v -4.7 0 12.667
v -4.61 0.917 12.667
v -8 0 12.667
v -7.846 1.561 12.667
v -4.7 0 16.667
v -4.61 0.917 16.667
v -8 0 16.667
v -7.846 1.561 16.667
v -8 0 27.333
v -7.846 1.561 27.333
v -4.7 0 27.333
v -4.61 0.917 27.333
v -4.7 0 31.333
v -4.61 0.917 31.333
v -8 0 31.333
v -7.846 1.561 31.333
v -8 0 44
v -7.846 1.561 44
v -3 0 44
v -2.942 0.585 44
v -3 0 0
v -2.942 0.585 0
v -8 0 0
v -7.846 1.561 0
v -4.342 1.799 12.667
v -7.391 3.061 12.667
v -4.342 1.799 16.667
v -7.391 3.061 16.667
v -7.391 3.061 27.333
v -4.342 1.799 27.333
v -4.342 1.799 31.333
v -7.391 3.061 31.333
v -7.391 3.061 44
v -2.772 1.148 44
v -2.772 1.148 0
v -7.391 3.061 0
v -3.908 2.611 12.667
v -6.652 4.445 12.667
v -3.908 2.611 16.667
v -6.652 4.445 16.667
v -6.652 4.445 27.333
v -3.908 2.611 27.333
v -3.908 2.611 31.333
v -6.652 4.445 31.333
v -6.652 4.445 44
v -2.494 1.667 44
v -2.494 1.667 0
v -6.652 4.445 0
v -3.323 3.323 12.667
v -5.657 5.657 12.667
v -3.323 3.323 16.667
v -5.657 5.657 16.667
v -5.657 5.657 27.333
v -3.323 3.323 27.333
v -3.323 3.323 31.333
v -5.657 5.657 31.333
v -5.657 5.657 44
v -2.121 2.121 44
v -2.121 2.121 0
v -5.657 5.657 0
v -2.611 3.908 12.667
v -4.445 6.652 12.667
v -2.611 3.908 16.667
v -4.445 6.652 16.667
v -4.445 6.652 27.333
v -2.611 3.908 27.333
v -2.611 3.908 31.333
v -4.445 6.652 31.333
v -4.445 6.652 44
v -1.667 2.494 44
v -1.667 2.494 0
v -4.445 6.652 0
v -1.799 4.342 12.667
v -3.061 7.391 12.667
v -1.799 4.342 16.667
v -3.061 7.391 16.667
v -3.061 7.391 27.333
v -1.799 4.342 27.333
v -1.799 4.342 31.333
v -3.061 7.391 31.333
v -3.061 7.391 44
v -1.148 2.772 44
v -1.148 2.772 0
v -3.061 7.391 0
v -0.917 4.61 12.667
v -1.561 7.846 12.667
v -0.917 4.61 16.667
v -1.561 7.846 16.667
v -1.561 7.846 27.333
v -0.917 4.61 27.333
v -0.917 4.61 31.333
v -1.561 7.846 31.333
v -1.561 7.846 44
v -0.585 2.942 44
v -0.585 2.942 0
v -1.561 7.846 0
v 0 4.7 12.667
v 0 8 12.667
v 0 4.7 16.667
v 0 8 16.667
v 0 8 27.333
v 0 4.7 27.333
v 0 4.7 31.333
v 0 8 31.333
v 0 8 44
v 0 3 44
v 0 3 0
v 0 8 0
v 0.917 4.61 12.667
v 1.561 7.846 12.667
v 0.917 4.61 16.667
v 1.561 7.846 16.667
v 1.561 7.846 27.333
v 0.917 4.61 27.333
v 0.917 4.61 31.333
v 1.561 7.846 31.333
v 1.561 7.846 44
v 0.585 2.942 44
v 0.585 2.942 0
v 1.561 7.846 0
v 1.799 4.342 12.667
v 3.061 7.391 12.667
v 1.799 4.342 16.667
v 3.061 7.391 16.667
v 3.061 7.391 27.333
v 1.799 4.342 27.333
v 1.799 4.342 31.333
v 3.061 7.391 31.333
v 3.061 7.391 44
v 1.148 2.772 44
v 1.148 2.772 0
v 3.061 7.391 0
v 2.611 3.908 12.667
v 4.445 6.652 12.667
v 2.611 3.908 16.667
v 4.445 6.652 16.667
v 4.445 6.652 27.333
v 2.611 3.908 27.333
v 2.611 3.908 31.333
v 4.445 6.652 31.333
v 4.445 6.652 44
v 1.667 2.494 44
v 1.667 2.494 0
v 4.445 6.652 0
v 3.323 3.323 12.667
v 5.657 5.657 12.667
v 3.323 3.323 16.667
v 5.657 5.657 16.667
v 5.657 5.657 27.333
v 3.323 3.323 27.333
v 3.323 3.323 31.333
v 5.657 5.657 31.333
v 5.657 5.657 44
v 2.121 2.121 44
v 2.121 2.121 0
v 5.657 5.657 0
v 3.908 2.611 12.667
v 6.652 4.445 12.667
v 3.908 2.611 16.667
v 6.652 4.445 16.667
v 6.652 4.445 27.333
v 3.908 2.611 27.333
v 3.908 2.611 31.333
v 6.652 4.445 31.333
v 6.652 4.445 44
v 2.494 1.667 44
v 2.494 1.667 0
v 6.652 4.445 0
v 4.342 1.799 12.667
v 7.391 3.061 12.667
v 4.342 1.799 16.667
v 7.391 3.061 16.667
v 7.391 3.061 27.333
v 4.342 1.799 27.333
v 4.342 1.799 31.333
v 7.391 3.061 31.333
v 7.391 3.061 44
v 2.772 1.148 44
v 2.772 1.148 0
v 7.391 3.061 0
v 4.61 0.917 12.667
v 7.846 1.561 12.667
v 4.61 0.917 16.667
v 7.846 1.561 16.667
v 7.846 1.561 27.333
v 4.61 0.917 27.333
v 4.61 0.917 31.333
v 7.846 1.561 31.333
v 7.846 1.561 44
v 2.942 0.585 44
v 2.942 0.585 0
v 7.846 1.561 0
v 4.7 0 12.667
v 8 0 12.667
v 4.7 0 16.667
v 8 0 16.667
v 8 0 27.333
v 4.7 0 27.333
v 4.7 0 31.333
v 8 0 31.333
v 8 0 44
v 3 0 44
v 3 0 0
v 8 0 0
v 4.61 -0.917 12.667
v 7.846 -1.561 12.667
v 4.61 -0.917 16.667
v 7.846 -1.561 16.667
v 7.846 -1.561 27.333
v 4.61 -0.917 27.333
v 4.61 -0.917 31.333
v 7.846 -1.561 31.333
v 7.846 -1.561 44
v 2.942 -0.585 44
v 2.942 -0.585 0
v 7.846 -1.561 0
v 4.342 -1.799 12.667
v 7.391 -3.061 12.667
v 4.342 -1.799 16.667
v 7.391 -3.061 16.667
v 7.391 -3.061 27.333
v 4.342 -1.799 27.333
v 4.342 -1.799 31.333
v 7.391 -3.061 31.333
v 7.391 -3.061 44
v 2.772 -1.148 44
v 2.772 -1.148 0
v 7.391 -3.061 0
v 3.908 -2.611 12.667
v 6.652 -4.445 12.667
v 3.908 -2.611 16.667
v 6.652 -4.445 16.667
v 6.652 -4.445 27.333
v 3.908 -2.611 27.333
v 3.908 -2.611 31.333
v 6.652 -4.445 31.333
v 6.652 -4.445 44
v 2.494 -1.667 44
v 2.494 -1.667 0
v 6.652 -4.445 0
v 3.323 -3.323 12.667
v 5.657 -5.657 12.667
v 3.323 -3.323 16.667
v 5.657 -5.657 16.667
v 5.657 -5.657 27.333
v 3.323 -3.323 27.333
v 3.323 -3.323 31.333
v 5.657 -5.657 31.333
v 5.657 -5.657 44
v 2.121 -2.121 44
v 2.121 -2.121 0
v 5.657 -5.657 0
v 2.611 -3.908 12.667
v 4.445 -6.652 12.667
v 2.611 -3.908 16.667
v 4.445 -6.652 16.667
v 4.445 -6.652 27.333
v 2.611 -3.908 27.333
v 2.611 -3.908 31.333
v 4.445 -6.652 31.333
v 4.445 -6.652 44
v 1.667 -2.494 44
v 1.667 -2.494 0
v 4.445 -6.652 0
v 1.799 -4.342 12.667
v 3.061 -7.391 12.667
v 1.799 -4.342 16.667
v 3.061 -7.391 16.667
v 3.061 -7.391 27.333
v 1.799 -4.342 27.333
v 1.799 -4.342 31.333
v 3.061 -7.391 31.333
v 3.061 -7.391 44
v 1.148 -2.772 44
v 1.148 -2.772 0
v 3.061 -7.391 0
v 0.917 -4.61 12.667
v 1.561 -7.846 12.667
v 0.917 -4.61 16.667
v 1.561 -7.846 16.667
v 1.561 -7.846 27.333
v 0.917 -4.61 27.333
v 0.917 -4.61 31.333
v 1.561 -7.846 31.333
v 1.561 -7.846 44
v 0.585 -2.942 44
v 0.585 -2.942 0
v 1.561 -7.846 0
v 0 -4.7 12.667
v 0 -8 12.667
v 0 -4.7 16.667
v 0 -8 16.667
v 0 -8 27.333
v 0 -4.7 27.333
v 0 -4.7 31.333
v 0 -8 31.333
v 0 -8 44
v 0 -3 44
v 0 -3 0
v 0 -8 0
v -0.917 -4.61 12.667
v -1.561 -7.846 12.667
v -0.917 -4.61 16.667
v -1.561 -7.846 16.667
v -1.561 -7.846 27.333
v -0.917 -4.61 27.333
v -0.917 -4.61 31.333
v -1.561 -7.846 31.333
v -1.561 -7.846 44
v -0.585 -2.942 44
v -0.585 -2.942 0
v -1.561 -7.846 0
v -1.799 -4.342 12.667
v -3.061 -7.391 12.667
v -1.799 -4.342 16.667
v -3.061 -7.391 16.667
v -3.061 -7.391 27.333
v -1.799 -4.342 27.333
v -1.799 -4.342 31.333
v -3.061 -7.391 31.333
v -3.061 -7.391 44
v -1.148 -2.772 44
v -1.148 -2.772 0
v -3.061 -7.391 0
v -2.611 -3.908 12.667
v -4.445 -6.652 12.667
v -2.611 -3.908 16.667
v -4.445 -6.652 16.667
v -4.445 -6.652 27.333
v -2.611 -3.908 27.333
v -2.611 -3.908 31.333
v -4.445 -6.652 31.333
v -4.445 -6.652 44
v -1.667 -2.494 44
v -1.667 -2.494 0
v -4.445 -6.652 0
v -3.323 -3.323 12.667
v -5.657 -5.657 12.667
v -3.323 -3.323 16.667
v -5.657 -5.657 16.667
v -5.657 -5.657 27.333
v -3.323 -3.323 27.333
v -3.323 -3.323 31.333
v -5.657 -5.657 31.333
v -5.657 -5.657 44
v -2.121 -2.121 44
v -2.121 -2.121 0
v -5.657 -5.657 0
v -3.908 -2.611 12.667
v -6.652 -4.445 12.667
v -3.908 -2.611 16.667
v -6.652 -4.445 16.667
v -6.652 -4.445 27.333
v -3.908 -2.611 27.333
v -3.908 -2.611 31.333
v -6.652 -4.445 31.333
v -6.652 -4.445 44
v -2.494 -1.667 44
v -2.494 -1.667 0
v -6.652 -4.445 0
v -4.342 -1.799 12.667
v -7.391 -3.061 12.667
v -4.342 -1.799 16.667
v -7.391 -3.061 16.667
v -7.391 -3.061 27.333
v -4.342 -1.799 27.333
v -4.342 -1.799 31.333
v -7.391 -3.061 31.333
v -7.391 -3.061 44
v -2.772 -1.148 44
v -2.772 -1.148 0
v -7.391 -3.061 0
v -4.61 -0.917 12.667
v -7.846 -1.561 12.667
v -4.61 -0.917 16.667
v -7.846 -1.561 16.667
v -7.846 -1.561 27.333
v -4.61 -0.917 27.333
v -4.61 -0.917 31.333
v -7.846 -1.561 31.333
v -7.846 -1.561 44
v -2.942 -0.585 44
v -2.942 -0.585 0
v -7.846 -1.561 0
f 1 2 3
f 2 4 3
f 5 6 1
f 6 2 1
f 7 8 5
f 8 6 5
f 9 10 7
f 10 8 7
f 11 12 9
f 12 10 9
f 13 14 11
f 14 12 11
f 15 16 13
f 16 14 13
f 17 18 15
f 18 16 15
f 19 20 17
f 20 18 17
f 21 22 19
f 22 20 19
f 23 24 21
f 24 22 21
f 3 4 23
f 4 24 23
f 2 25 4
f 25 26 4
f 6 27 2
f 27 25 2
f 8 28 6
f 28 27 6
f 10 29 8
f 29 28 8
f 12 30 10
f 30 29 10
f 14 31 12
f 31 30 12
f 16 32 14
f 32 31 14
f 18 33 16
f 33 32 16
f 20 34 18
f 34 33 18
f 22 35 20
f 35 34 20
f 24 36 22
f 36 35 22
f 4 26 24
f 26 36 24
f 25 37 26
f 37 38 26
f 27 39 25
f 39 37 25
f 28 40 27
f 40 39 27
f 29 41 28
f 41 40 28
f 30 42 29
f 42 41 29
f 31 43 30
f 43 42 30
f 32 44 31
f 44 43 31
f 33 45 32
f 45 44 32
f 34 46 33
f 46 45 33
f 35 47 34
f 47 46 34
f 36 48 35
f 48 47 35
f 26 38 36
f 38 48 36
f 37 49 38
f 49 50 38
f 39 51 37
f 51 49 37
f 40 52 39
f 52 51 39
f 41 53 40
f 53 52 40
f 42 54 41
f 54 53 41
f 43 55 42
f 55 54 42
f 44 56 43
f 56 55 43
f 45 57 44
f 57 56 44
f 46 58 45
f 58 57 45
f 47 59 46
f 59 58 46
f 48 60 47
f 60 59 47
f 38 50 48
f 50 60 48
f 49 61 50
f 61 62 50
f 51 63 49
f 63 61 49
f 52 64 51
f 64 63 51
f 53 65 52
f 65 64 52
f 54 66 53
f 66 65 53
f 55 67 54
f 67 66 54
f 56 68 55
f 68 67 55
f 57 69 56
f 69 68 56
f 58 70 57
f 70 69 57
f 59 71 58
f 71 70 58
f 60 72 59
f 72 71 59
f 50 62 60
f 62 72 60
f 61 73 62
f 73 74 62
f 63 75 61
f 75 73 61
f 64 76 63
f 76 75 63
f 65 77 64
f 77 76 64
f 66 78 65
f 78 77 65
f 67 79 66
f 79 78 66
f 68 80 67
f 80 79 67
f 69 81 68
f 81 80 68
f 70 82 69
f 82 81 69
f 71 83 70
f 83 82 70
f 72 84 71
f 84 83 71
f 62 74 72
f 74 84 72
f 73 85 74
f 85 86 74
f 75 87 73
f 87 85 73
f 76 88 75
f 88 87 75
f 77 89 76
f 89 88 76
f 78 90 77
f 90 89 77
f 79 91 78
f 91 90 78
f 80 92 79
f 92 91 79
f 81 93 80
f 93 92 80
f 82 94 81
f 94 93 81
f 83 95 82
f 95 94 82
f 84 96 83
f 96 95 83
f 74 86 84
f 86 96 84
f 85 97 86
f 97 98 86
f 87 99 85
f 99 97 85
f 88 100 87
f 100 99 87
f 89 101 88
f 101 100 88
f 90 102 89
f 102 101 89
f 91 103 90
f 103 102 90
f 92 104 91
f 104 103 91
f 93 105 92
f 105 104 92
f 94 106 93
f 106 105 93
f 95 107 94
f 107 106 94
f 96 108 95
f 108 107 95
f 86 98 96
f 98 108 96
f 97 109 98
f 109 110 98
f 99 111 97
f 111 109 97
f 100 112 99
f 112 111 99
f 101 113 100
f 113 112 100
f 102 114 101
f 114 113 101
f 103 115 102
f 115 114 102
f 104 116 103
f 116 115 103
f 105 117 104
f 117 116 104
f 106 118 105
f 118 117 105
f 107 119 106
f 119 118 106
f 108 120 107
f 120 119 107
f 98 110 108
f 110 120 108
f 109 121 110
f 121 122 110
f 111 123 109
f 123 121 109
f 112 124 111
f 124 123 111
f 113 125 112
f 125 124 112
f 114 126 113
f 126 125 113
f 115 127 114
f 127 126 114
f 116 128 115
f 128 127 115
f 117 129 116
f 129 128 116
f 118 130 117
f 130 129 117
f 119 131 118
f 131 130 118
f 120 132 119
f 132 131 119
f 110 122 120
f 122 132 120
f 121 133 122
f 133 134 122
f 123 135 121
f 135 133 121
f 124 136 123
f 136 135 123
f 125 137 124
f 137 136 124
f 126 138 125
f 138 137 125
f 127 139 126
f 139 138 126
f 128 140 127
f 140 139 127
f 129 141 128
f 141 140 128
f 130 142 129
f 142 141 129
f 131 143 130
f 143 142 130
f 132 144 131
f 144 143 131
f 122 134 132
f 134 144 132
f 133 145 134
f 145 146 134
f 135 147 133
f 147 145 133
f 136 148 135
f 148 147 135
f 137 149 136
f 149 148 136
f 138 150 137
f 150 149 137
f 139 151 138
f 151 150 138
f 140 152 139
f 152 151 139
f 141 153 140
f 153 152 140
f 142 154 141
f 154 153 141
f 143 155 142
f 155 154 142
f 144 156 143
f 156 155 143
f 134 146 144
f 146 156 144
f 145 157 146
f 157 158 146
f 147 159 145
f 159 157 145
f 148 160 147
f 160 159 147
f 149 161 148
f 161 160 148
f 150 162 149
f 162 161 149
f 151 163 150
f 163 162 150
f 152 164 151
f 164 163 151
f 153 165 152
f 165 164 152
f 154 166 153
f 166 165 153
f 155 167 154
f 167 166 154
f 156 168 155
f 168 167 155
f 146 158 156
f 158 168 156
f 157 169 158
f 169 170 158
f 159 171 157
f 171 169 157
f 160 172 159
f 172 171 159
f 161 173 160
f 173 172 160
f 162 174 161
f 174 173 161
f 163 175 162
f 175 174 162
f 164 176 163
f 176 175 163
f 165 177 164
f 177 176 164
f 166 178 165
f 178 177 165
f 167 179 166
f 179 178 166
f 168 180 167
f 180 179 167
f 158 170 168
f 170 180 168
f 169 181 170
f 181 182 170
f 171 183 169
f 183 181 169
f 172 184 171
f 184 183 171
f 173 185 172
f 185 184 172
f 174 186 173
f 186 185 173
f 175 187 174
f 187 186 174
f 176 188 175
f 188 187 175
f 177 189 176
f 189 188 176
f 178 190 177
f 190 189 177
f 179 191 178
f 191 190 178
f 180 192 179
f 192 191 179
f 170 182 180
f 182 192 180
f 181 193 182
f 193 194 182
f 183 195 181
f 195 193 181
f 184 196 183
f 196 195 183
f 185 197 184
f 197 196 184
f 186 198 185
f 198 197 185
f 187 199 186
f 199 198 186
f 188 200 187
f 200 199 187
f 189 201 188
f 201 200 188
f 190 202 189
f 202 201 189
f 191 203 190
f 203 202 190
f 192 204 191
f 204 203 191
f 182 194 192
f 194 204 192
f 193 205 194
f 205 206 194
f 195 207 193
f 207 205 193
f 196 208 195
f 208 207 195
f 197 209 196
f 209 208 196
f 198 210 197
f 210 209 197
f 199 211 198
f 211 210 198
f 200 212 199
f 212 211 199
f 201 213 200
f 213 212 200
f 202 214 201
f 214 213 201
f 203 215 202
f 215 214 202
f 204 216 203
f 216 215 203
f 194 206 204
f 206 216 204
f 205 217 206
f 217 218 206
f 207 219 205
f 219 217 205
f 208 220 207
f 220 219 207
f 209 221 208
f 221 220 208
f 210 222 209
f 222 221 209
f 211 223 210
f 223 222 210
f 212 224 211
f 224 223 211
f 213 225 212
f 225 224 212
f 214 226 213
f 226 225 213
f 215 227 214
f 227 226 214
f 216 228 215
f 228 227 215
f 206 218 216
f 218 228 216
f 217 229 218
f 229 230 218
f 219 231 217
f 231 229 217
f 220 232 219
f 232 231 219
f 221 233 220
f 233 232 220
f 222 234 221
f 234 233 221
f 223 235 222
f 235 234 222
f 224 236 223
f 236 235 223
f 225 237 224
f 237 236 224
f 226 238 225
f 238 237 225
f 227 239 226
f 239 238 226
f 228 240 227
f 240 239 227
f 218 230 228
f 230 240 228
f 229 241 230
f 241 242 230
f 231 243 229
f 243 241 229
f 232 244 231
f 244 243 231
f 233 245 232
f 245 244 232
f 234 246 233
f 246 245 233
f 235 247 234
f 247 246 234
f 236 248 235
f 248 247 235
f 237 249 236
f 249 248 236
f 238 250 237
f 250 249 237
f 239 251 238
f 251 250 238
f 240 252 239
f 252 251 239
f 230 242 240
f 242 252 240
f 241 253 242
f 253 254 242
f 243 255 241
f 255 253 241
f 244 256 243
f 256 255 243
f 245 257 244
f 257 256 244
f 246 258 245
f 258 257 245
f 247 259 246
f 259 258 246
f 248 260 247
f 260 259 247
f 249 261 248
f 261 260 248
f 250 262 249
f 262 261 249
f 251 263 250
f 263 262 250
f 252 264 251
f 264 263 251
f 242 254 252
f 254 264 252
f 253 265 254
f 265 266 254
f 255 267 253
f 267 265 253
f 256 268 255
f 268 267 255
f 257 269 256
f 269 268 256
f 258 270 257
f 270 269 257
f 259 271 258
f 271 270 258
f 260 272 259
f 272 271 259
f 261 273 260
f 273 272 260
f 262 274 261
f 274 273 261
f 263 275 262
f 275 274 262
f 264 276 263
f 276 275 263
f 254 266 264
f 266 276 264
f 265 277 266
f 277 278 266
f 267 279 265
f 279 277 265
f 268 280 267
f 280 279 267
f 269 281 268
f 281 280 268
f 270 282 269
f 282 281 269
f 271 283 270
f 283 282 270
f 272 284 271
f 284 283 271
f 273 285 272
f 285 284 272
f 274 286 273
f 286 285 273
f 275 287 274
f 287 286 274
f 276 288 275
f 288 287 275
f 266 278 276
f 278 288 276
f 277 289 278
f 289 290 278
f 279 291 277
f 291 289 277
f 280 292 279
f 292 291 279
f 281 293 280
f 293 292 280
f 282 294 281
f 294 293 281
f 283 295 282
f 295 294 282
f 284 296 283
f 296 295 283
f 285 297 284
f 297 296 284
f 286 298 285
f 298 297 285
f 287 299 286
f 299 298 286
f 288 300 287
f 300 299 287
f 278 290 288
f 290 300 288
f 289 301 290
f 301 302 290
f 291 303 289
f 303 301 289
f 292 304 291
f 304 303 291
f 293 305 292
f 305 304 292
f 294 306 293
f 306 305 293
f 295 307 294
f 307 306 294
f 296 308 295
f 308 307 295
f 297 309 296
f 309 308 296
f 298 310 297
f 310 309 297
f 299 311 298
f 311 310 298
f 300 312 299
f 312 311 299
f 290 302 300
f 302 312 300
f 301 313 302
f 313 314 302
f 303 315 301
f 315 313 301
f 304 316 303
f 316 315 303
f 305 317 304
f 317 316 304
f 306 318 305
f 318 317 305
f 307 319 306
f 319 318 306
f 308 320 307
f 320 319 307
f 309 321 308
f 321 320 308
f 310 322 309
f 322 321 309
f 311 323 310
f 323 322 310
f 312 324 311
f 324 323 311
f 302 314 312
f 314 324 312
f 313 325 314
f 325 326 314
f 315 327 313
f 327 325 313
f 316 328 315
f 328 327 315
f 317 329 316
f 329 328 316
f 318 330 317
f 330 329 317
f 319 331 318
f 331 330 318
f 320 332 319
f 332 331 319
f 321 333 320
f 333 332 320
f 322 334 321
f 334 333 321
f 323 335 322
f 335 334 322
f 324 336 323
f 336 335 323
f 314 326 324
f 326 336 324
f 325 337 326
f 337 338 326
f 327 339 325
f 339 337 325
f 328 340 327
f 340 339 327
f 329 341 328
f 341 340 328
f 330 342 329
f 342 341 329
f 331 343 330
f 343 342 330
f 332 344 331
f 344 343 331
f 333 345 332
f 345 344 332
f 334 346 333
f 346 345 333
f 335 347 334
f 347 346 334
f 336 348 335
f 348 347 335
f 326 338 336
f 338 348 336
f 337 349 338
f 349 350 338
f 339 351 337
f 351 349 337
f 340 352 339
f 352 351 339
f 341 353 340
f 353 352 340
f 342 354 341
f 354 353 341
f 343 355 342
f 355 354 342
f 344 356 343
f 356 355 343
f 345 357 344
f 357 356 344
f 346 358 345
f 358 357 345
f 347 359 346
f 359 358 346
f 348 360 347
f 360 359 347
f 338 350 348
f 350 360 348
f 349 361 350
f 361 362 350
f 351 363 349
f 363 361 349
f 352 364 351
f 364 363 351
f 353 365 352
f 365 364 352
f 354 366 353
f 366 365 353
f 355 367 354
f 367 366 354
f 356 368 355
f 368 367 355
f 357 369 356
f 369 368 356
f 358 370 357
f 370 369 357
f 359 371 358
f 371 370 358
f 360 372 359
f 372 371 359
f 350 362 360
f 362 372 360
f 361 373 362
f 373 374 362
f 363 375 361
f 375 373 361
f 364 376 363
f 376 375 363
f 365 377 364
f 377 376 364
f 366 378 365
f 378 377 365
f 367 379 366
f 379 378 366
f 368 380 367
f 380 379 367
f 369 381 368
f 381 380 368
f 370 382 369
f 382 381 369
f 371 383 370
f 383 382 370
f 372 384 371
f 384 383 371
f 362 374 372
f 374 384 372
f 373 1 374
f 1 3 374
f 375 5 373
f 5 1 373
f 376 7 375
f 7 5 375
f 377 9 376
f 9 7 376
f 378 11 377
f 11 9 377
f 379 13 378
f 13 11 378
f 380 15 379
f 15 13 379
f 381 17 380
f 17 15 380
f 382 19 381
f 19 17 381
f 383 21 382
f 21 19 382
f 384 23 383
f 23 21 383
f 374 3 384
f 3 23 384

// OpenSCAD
$fn = 32;

// ----------------------------------------------------------------------
// Grooved revolve: plain_grooves, bore R3
// ----------------------------------------------------------------------

// --- parameters (mm) ---
bore_r = 3;               // bore radius
outer_r = 8;              // outer radius of the body
total_h = 44;             // overall height, Z
wall = 5;                 // radial wall thickness
groove_w = 4;             // groove width
groove_d = 3.3;           // groove depth
grooves = 2;              // number of outer grooves

bbox_x = 2 * outer_r;  // full diameter
bore_d = 2 * bore_r;  // bore diameter
body_d = 2 * outer_r;  // body diameter
revolve_angle = 360;  // full turn around the Z axis

profile = [[3, 0], [8, 0], [8, 12.667], [4.7, 12.667], [4.7, 16.667], [8, 16.667], [8, 27.333], [4.7, 27.333], [4.7, 31.333], [8, 31.333], [8, 44], [3, 44]];  // primary outline, 12 points, counter clockwise

// --- the one profile operation ---
rotate_extrude(angle = revolve_angle) polygon(points = profile);
